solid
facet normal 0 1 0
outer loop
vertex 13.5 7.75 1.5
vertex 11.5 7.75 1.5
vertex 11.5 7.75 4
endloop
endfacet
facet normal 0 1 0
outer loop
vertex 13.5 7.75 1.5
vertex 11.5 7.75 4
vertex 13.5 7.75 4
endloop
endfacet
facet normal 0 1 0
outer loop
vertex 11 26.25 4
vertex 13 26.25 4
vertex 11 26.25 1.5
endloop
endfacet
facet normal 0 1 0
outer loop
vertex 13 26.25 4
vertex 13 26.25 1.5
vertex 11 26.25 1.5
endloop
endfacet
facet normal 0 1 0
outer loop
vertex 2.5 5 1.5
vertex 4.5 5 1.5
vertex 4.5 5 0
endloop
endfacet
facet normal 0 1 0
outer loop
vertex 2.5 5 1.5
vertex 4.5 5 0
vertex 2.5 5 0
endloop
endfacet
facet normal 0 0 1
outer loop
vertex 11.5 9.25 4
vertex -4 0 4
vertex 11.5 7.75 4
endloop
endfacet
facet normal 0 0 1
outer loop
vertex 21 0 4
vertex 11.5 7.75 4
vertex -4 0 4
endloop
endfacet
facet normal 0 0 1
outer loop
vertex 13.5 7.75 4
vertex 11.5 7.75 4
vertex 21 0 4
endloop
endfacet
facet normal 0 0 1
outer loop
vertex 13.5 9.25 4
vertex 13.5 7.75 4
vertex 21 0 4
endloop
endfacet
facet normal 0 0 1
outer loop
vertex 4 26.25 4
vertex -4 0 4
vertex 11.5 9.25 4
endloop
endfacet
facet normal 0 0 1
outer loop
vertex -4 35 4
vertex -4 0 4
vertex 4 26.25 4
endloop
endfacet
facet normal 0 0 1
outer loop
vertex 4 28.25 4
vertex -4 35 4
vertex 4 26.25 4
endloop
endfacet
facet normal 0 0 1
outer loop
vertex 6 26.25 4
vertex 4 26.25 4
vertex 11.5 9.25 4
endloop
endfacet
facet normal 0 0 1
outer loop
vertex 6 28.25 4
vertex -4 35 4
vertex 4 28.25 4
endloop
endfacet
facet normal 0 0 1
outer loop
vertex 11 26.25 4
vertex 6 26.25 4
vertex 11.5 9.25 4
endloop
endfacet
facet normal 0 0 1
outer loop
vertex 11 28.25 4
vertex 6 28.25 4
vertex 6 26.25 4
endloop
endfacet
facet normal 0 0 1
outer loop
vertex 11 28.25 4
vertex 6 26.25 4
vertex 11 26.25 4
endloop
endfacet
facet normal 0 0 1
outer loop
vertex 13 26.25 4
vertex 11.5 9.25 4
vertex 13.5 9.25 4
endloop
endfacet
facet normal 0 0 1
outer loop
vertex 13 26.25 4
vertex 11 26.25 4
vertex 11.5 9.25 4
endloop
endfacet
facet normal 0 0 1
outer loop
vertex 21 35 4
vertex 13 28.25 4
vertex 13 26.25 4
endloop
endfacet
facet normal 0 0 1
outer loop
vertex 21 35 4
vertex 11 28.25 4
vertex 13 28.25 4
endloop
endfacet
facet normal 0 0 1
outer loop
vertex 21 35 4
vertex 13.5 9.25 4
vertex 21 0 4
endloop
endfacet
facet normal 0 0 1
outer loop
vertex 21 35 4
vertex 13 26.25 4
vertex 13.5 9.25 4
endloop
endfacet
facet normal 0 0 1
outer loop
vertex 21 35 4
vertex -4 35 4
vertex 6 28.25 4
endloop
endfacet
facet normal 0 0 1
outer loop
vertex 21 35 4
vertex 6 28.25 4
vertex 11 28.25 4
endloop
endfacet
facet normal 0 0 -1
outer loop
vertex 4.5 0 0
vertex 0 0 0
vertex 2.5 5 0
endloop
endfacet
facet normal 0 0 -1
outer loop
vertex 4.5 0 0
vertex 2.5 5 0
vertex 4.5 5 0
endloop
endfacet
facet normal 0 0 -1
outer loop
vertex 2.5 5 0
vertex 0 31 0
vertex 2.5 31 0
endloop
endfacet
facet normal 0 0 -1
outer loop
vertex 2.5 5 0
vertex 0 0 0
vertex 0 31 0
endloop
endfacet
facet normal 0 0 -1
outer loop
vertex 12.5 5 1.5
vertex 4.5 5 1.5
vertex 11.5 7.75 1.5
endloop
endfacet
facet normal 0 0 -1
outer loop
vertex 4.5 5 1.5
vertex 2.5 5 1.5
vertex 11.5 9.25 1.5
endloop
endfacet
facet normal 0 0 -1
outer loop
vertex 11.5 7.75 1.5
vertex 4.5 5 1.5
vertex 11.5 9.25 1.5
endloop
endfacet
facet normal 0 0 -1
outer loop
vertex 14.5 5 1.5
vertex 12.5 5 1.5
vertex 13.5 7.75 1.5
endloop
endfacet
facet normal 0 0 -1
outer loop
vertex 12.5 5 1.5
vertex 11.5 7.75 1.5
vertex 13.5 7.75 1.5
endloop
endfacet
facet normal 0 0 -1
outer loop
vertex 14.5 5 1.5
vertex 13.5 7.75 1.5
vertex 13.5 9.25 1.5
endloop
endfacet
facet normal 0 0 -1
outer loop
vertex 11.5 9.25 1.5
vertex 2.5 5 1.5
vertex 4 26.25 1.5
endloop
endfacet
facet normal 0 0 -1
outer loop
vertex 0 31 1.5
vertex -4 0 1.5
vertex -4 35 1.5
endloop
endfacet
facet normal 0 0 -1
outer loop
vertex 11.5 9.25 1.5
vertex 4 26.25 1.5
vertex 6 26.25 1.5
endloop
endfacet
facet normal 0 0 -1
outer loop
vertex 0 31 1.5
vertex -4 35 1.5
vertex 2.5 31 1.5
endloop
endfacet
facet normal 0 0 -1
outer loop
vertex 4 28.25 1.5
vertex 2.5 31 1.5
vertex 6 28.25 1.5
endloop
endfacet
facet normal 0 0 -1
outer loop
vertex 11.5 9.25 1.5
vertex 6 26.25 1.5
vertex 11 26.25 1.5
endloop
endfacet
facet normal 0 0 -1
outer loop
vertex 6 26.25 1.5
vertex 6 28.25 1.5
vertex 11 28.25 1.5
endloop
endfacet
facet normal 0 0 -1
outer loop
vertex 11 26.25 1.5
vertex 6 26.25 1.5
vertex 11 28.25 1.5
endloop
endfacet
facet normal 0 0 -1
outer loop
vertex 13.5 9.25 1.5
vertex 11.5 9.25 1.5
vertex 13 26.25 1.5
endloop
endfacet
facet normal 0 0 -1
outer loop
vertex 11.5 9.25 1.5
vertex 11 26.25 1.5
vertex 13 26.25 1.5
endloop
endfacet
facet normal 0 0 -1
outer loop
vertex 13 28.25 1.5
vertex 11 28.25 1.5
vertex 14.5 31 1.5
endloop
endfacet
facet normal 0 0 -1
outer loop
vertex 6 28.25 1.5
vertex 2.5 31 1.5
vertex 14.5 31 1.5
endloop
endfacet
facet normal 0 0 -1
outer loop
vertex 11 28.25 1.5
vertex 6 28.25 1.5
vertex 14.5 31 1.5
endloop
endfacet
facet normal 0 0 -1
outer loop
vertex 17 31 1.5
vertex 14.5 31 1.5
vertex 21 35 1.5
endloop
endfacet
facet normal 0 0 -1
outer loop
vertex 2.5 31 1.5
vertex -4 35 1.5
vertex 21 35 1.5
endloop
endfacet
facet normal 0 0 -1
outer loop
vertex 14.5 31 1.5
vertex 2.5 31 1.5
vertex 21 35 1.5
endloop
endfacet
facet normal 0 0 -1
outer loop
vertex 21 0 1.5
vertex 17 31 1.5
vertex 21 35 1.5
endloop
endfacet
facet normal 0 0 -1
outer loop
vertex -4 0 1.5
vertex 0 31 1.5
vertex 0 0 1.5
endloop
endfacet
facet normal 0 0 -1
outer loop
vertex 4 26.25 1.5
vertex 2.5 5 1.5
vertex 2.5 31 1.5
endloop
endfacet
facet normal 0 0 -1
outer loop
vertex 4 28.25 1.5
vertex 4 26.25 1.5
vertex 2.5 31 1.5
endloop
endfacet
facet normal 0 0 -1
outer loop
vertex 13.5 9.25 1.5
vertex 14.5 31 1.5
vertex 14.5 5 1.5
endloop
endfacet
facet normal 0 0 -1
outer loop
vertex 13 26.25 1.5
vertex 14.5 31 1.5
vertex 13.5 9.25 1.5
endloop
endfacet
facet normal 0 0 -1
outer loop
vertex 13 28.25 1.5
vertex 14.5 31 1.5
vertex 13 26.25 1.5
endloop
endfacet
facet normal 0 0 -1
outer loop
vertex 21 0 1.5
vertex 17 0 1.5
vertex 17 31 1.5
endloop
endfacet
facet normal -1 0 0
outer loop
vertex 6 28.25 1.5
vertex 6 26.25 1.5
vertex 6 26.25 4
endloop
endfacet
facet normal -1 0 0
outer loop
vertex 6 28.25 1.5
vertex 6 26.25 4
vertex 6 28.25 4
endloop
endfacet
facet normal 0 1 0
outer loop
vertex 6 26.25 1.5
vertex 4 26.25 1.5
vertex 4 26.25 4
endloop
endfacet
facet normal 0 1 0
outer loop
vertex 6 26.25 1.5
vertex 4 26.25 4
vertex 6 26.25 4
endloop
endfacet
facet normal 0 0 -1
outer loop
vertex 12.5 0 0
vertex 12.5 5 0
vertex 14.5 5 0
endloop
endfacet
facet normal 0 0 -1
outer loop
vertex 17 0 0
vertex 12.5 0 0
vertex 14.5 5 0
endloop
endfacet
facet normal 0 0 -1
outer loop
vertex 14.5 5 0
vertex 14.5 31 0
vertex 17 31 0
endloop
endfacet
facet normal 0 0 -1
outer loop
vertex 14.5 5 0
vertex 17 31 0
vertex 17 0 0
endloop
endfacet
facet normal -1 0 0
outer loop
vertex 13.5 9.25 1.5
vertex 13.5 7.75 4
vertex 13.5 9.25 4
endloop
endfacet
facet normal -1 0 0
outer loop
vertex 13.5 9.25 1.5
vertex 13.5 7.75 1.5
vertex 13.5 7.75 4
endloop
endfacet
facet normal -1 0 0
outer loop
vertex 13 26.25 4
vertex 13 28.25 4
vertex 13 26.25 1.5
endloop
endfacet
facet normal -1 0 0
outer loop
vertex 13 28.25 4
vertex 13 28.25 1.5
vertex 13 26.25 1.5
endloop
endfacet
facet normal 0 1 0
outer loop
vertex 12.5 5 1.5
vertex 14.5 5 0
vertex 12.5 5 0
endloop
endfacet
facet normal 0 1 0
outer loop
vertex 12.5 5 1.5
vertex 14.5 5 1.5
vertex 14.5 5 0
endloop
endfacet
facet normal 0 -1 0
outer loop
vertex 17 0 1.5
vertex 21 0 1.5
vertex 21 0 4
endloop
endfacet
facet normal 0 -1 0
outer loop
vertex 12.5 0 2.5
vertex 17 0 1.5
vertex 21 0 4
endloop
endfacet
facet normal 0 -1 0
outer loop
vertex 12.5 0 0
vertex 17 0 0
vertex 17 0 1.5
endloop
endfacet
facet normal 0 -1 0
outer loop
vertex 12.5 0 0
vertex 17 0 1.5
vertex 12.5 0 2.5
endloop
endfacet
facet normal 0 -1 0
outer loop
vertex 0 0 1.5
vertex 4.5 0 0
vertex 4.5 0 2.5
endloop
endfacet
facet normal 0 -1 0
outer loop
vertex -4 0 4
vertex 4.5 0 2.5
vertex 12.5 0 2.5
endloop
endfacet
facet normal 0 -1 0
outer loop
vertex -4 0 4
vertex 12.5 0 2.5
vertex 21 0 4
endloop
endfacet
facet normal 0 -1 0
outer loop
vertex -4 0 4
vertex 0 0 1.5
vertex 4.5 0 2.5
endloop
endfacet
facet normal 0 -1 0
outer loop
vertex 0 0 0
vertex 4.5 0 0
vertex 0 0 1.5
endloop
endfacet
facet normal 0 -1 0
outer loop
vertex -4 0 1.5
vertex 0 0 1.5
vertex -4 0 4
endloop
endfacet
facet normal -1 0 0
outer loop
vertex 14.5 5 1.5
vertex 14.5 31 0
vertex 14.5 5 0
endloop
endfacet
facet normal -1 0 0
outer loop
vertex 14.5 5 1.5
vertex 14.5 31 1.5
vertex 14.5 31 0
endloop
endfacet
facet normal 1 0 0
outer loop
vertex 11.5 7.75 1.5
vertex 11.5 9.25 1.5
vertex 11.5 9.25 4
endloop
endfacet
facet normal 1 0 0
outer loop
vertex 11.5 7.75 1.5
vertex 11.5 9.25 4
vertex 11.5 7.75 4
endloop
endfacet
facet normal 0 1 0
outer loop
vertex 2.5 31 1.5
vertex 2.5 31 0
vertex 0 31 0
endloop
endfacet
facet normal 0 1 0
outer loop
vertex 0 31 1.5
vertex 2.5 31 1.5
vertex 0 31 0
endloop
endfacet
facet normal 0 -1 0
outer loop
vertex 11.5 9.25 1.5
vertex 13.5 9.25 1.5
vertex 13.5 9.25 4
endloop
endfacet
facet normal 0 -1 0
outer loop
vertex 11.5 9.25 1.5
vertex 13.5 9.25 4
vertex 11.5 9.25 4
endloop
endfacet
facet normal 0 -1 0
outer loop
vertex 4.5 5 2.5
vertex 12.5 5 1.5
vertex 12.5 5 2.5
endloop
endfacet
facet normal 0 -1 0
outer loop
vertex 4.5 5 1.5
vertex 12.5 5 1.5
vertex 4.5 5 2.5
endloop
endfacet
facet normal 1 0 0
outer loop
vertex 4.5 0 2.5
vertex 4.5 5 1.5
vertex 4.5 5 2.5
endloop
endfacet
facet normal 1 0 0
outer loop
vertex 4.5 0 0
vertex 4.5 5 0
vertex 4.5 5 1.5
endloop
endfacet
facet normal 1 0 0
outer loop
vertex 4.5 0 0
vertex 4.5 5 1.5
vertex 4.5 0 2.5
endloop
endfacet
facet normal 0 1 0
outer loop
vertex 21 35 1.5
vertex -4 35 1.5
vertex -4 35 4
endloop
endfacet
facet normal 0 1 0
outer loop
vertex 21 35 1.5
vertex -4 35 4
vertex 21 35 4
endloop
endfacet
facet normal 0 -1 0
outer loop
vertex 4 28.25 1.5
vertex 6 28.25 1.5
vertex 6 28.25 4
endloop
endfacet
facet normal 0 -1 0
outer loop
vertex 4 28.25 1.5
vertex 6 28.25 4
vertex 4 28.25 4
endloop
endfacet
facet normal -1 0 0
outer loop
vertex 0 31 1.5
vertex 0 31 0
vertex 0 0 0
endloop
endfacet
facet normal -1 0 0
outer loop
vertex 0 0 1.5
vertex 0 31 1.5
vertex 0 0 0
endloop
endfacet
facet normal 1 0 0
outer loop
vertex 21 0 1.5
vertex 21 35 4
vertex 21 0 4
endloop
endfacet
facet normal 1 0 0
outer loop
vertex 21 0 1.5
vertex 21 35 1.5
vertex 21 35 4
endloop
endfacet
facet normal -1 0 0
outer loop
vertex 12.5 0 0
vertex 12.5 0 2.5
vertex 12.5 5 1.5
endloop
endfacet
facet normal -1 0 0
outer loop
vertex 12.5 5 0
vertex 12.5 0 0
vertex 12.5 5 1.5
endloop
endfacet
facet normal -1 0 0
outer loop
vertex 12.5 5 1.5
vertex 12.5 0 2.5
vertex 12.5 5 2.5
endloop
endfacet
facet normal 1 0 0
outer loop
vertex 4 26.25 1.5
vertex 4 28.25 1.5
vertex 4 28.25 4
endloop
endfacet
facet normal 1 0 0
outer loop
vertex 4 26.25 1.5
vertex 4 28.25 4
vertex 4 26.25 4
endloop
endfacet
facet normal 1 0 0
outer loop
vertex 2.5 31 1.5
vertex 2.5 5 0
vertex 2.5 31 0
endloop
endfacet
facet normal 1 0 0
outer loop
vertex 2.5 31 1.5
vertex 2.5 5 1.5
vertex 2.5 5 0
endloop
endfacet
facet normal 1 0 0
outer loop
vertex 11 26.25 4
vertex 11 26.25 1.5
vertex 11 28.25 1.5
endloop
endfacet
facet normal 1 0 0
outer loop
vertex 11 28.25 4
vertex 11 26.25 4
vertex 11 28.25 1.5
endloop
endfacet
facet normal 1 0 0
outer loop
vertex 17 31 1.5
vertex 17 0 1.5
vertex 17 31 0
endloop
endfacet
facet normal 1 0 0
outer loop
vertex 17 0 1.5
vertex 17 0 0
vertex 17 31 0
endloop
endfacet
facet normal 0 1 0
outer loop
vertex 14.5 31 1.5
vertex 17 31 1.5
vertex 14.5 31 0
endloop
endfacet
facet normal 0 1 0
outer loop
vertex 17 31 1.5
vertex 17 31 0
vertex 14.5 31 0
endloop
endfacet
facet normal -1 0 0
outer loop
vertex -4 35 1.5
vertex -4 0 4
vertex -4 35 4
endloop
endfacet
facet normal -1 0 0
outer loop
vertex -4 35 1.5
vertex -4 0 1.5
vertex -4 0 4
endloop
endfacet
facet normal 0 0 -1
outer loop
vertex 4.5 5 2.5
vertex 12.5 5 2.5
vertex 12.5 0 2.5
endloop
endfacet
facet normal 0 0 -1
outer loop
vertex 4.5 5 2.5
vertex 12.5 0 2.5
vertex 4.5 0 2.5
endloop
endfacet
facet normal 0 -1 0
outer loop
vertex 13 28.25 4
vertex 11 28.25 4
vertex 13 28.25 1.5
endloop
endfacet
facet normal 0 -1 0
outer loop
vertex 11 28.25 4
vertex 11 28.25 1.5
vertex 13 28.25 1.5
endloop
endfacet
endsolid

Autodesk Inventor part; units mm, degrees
ref_plane "YZ Plane" through (0, 0, 0) normal (1, 0, 0) x (0, 1, 0)
ref_plane "XZ Plane" through (0, 0, 0) normal (0, 1, 0) x (-1, 0, 0)
ref_plane "XY Plane" through (0, 0, 0) normal (0, 0, 1) x (1, 0, 0)
sketch "Sketch1" plane through (0, 0, 0) normal (0, 0, 1) x (1, 0, 0)
  line L0 (0, 0) -> (17, 0)
  line L1 (17, 0) -> (17, 31)
  line L2 (17, 31) -> (0, 31)
  line L3 (0, 31) -> (0, 0)
  dimension "d0" = 17
  dimension "d1" = 31
extrude "Extrusion1" add sketch "Sketch1" along normal blind 1.5
sketch "Sketch2" plane through (0, 0, 1.5) normal (0, 0, 1) x (1, 0, 0)
  line L0 (17, 31) -> (0, 31) projected
  line L1 (2.5, 31) -> (14.5, 31)
  line L2 (14.5, 31) -> (14.5, 5)
  line L3 (14.5, 5) -> (2.5, 5)
  line L4 (2.5, 5) -> (2.5, 31)
  line L5 (0, 0) -> (17, 0) projected
  line L6 (4.5, 0) -> (12.5, 0)
  line L7 (12.5, 0) -> (12.5, 5)
  line L8 (12.5, 5) -> (4.5, 5)
  line L9 (4.5, 5) -> (4.5, 0)
  line L10 (0, 31) -> (0, 0) projected
  point P0 (4.5, 5)
  dimension "d4" = 12
  dimension "d5" = 8
  dimension "d6" = 5
  dimension "d7" = 17
  dimension "d8" = 2.5
  dimension "d9" = 4.5
extrude "Extrusion2" cut sketch "Sketch2" against normal up to surface (1.5 mm away) contours L2 L3 L4 L0 | L7 L5 L9 L3
sketch "Sketch3" plane through (0, 0, 1.5) normal (0, 0, 1) x (1, 0, 0)
  line L0 (-4, 35) -> (21, 35)
  line L1 (21, 35) -> (21, 0)
  line L2 (21, 0) -> (-4, 0)
  line L3 (-4, 0) -> (-4, 35)
  line L4 (2.5, 31) -> (0, 31) projected
  line L5 (0, 31) -> (0, 0) projected
  line L6 (17, 0) -> (17, 31) projected
  line L7 (0, 0) -> (4.5, 0) projected
  dimension "d12" = 4
  dimension "d13" = 4
  dimension "d14" = 4
extrude "Extrusion3" add sketch "Sketch3" along normal blind 2.5
sketch "Sketch4" plane through (0, 0, 1.5) normal (0, 0, -1) x (-1, 0, 0)
  line L0 (0, 0) -> (-4.5, 0) projected
  line L1 (-4.5, 0) -> (-12.5, 0)
  line L2 (-12.5, 0) -> (-12.5, 5)
  line L3 (-12.5, 5) -> (-4.5, 5)
  line L4 (-4.5, 5) -> (-4.5, 0)
extrude "Extrusion4" cut sketch "Sketch4" against normal blind 1
sketch "Sketch5" plane through (0, 0, 1.5) normal (0, 0, -1) x (-1, 0, 0)
  line L0 (-11.5, 7.75) -> (-13.5, 7.75)
  line L1 (-13.5, 7.75) -> (-13.5, 9.25)
  line L2 (-13.5, 9.25) -> (-11.5, 9.25)
  line L3 (-11.5, 9.25) -> (-11.5, 7.75)
  line L4 (-12.5, 5) -> (-4.5, 5) projected
  line L5 (-4.5, 5) -> (-4.5, 0) projected
  line L6 (-12.5, 0) -> (-12.5, 5) projected
  point P0 (0, 0)
  dimension "d19" = 2
  dimension "d20" = 1.5
  dimension "d21" = 2.75
  dimension "d25" = 1
extrude "Extrusion5" cut sketch "Sketch5" against normal through all
sketch "Sketch6" plane through (0, 0, 1.5) normal (0, 0, -1) x (-1, 0, 0)
  line L0 (-4, 26.25) -> (-6, 26.25)
  line L1 (-6, 26.25) -> (-6, 28.25)
  line L2 (-6, 28.25) -> (-4, 28.25)
  line L3 (-4, 28.25) -> (-4, 26.25)
  line L4 (-2.5, 31) -> (0, 31) projected
  line L5 (-2.5, 5) -> (-2.5, 31) projected
  line L6 (0, 31) -> (0, 0) projected
  line L7 (-12.5, 5) -> (-4.5, 5) projected
  line L8 (-8.5, 5) -> (-8.5, 35)
  line L9 (-21, 35) -> (4, 35) projected
  line L10 (-13, 26.25) -> (-11, 26.25)
  line L11 (-11, 26.25) -> (-11, 28.25)
  line L12 (-11, 28.25) -> (-13, 28.25)
  line L13 (-13, 28.25) -> (-13, 26.25)
  dimension "d26" = 2.75
  dimension "d27" = 2
  dimension "d28" = 2
  dimension "d30" = 4
extrude "Extrusion6" cut sketch "Sketch6" against normal through all
equation "\"d8\" = -0.5 * d4 + 0.5 * d7"
equation "\"d9\" = -0.5 * d5 + 0.5 * d7"
properties part number "ds input capture cover v1"
